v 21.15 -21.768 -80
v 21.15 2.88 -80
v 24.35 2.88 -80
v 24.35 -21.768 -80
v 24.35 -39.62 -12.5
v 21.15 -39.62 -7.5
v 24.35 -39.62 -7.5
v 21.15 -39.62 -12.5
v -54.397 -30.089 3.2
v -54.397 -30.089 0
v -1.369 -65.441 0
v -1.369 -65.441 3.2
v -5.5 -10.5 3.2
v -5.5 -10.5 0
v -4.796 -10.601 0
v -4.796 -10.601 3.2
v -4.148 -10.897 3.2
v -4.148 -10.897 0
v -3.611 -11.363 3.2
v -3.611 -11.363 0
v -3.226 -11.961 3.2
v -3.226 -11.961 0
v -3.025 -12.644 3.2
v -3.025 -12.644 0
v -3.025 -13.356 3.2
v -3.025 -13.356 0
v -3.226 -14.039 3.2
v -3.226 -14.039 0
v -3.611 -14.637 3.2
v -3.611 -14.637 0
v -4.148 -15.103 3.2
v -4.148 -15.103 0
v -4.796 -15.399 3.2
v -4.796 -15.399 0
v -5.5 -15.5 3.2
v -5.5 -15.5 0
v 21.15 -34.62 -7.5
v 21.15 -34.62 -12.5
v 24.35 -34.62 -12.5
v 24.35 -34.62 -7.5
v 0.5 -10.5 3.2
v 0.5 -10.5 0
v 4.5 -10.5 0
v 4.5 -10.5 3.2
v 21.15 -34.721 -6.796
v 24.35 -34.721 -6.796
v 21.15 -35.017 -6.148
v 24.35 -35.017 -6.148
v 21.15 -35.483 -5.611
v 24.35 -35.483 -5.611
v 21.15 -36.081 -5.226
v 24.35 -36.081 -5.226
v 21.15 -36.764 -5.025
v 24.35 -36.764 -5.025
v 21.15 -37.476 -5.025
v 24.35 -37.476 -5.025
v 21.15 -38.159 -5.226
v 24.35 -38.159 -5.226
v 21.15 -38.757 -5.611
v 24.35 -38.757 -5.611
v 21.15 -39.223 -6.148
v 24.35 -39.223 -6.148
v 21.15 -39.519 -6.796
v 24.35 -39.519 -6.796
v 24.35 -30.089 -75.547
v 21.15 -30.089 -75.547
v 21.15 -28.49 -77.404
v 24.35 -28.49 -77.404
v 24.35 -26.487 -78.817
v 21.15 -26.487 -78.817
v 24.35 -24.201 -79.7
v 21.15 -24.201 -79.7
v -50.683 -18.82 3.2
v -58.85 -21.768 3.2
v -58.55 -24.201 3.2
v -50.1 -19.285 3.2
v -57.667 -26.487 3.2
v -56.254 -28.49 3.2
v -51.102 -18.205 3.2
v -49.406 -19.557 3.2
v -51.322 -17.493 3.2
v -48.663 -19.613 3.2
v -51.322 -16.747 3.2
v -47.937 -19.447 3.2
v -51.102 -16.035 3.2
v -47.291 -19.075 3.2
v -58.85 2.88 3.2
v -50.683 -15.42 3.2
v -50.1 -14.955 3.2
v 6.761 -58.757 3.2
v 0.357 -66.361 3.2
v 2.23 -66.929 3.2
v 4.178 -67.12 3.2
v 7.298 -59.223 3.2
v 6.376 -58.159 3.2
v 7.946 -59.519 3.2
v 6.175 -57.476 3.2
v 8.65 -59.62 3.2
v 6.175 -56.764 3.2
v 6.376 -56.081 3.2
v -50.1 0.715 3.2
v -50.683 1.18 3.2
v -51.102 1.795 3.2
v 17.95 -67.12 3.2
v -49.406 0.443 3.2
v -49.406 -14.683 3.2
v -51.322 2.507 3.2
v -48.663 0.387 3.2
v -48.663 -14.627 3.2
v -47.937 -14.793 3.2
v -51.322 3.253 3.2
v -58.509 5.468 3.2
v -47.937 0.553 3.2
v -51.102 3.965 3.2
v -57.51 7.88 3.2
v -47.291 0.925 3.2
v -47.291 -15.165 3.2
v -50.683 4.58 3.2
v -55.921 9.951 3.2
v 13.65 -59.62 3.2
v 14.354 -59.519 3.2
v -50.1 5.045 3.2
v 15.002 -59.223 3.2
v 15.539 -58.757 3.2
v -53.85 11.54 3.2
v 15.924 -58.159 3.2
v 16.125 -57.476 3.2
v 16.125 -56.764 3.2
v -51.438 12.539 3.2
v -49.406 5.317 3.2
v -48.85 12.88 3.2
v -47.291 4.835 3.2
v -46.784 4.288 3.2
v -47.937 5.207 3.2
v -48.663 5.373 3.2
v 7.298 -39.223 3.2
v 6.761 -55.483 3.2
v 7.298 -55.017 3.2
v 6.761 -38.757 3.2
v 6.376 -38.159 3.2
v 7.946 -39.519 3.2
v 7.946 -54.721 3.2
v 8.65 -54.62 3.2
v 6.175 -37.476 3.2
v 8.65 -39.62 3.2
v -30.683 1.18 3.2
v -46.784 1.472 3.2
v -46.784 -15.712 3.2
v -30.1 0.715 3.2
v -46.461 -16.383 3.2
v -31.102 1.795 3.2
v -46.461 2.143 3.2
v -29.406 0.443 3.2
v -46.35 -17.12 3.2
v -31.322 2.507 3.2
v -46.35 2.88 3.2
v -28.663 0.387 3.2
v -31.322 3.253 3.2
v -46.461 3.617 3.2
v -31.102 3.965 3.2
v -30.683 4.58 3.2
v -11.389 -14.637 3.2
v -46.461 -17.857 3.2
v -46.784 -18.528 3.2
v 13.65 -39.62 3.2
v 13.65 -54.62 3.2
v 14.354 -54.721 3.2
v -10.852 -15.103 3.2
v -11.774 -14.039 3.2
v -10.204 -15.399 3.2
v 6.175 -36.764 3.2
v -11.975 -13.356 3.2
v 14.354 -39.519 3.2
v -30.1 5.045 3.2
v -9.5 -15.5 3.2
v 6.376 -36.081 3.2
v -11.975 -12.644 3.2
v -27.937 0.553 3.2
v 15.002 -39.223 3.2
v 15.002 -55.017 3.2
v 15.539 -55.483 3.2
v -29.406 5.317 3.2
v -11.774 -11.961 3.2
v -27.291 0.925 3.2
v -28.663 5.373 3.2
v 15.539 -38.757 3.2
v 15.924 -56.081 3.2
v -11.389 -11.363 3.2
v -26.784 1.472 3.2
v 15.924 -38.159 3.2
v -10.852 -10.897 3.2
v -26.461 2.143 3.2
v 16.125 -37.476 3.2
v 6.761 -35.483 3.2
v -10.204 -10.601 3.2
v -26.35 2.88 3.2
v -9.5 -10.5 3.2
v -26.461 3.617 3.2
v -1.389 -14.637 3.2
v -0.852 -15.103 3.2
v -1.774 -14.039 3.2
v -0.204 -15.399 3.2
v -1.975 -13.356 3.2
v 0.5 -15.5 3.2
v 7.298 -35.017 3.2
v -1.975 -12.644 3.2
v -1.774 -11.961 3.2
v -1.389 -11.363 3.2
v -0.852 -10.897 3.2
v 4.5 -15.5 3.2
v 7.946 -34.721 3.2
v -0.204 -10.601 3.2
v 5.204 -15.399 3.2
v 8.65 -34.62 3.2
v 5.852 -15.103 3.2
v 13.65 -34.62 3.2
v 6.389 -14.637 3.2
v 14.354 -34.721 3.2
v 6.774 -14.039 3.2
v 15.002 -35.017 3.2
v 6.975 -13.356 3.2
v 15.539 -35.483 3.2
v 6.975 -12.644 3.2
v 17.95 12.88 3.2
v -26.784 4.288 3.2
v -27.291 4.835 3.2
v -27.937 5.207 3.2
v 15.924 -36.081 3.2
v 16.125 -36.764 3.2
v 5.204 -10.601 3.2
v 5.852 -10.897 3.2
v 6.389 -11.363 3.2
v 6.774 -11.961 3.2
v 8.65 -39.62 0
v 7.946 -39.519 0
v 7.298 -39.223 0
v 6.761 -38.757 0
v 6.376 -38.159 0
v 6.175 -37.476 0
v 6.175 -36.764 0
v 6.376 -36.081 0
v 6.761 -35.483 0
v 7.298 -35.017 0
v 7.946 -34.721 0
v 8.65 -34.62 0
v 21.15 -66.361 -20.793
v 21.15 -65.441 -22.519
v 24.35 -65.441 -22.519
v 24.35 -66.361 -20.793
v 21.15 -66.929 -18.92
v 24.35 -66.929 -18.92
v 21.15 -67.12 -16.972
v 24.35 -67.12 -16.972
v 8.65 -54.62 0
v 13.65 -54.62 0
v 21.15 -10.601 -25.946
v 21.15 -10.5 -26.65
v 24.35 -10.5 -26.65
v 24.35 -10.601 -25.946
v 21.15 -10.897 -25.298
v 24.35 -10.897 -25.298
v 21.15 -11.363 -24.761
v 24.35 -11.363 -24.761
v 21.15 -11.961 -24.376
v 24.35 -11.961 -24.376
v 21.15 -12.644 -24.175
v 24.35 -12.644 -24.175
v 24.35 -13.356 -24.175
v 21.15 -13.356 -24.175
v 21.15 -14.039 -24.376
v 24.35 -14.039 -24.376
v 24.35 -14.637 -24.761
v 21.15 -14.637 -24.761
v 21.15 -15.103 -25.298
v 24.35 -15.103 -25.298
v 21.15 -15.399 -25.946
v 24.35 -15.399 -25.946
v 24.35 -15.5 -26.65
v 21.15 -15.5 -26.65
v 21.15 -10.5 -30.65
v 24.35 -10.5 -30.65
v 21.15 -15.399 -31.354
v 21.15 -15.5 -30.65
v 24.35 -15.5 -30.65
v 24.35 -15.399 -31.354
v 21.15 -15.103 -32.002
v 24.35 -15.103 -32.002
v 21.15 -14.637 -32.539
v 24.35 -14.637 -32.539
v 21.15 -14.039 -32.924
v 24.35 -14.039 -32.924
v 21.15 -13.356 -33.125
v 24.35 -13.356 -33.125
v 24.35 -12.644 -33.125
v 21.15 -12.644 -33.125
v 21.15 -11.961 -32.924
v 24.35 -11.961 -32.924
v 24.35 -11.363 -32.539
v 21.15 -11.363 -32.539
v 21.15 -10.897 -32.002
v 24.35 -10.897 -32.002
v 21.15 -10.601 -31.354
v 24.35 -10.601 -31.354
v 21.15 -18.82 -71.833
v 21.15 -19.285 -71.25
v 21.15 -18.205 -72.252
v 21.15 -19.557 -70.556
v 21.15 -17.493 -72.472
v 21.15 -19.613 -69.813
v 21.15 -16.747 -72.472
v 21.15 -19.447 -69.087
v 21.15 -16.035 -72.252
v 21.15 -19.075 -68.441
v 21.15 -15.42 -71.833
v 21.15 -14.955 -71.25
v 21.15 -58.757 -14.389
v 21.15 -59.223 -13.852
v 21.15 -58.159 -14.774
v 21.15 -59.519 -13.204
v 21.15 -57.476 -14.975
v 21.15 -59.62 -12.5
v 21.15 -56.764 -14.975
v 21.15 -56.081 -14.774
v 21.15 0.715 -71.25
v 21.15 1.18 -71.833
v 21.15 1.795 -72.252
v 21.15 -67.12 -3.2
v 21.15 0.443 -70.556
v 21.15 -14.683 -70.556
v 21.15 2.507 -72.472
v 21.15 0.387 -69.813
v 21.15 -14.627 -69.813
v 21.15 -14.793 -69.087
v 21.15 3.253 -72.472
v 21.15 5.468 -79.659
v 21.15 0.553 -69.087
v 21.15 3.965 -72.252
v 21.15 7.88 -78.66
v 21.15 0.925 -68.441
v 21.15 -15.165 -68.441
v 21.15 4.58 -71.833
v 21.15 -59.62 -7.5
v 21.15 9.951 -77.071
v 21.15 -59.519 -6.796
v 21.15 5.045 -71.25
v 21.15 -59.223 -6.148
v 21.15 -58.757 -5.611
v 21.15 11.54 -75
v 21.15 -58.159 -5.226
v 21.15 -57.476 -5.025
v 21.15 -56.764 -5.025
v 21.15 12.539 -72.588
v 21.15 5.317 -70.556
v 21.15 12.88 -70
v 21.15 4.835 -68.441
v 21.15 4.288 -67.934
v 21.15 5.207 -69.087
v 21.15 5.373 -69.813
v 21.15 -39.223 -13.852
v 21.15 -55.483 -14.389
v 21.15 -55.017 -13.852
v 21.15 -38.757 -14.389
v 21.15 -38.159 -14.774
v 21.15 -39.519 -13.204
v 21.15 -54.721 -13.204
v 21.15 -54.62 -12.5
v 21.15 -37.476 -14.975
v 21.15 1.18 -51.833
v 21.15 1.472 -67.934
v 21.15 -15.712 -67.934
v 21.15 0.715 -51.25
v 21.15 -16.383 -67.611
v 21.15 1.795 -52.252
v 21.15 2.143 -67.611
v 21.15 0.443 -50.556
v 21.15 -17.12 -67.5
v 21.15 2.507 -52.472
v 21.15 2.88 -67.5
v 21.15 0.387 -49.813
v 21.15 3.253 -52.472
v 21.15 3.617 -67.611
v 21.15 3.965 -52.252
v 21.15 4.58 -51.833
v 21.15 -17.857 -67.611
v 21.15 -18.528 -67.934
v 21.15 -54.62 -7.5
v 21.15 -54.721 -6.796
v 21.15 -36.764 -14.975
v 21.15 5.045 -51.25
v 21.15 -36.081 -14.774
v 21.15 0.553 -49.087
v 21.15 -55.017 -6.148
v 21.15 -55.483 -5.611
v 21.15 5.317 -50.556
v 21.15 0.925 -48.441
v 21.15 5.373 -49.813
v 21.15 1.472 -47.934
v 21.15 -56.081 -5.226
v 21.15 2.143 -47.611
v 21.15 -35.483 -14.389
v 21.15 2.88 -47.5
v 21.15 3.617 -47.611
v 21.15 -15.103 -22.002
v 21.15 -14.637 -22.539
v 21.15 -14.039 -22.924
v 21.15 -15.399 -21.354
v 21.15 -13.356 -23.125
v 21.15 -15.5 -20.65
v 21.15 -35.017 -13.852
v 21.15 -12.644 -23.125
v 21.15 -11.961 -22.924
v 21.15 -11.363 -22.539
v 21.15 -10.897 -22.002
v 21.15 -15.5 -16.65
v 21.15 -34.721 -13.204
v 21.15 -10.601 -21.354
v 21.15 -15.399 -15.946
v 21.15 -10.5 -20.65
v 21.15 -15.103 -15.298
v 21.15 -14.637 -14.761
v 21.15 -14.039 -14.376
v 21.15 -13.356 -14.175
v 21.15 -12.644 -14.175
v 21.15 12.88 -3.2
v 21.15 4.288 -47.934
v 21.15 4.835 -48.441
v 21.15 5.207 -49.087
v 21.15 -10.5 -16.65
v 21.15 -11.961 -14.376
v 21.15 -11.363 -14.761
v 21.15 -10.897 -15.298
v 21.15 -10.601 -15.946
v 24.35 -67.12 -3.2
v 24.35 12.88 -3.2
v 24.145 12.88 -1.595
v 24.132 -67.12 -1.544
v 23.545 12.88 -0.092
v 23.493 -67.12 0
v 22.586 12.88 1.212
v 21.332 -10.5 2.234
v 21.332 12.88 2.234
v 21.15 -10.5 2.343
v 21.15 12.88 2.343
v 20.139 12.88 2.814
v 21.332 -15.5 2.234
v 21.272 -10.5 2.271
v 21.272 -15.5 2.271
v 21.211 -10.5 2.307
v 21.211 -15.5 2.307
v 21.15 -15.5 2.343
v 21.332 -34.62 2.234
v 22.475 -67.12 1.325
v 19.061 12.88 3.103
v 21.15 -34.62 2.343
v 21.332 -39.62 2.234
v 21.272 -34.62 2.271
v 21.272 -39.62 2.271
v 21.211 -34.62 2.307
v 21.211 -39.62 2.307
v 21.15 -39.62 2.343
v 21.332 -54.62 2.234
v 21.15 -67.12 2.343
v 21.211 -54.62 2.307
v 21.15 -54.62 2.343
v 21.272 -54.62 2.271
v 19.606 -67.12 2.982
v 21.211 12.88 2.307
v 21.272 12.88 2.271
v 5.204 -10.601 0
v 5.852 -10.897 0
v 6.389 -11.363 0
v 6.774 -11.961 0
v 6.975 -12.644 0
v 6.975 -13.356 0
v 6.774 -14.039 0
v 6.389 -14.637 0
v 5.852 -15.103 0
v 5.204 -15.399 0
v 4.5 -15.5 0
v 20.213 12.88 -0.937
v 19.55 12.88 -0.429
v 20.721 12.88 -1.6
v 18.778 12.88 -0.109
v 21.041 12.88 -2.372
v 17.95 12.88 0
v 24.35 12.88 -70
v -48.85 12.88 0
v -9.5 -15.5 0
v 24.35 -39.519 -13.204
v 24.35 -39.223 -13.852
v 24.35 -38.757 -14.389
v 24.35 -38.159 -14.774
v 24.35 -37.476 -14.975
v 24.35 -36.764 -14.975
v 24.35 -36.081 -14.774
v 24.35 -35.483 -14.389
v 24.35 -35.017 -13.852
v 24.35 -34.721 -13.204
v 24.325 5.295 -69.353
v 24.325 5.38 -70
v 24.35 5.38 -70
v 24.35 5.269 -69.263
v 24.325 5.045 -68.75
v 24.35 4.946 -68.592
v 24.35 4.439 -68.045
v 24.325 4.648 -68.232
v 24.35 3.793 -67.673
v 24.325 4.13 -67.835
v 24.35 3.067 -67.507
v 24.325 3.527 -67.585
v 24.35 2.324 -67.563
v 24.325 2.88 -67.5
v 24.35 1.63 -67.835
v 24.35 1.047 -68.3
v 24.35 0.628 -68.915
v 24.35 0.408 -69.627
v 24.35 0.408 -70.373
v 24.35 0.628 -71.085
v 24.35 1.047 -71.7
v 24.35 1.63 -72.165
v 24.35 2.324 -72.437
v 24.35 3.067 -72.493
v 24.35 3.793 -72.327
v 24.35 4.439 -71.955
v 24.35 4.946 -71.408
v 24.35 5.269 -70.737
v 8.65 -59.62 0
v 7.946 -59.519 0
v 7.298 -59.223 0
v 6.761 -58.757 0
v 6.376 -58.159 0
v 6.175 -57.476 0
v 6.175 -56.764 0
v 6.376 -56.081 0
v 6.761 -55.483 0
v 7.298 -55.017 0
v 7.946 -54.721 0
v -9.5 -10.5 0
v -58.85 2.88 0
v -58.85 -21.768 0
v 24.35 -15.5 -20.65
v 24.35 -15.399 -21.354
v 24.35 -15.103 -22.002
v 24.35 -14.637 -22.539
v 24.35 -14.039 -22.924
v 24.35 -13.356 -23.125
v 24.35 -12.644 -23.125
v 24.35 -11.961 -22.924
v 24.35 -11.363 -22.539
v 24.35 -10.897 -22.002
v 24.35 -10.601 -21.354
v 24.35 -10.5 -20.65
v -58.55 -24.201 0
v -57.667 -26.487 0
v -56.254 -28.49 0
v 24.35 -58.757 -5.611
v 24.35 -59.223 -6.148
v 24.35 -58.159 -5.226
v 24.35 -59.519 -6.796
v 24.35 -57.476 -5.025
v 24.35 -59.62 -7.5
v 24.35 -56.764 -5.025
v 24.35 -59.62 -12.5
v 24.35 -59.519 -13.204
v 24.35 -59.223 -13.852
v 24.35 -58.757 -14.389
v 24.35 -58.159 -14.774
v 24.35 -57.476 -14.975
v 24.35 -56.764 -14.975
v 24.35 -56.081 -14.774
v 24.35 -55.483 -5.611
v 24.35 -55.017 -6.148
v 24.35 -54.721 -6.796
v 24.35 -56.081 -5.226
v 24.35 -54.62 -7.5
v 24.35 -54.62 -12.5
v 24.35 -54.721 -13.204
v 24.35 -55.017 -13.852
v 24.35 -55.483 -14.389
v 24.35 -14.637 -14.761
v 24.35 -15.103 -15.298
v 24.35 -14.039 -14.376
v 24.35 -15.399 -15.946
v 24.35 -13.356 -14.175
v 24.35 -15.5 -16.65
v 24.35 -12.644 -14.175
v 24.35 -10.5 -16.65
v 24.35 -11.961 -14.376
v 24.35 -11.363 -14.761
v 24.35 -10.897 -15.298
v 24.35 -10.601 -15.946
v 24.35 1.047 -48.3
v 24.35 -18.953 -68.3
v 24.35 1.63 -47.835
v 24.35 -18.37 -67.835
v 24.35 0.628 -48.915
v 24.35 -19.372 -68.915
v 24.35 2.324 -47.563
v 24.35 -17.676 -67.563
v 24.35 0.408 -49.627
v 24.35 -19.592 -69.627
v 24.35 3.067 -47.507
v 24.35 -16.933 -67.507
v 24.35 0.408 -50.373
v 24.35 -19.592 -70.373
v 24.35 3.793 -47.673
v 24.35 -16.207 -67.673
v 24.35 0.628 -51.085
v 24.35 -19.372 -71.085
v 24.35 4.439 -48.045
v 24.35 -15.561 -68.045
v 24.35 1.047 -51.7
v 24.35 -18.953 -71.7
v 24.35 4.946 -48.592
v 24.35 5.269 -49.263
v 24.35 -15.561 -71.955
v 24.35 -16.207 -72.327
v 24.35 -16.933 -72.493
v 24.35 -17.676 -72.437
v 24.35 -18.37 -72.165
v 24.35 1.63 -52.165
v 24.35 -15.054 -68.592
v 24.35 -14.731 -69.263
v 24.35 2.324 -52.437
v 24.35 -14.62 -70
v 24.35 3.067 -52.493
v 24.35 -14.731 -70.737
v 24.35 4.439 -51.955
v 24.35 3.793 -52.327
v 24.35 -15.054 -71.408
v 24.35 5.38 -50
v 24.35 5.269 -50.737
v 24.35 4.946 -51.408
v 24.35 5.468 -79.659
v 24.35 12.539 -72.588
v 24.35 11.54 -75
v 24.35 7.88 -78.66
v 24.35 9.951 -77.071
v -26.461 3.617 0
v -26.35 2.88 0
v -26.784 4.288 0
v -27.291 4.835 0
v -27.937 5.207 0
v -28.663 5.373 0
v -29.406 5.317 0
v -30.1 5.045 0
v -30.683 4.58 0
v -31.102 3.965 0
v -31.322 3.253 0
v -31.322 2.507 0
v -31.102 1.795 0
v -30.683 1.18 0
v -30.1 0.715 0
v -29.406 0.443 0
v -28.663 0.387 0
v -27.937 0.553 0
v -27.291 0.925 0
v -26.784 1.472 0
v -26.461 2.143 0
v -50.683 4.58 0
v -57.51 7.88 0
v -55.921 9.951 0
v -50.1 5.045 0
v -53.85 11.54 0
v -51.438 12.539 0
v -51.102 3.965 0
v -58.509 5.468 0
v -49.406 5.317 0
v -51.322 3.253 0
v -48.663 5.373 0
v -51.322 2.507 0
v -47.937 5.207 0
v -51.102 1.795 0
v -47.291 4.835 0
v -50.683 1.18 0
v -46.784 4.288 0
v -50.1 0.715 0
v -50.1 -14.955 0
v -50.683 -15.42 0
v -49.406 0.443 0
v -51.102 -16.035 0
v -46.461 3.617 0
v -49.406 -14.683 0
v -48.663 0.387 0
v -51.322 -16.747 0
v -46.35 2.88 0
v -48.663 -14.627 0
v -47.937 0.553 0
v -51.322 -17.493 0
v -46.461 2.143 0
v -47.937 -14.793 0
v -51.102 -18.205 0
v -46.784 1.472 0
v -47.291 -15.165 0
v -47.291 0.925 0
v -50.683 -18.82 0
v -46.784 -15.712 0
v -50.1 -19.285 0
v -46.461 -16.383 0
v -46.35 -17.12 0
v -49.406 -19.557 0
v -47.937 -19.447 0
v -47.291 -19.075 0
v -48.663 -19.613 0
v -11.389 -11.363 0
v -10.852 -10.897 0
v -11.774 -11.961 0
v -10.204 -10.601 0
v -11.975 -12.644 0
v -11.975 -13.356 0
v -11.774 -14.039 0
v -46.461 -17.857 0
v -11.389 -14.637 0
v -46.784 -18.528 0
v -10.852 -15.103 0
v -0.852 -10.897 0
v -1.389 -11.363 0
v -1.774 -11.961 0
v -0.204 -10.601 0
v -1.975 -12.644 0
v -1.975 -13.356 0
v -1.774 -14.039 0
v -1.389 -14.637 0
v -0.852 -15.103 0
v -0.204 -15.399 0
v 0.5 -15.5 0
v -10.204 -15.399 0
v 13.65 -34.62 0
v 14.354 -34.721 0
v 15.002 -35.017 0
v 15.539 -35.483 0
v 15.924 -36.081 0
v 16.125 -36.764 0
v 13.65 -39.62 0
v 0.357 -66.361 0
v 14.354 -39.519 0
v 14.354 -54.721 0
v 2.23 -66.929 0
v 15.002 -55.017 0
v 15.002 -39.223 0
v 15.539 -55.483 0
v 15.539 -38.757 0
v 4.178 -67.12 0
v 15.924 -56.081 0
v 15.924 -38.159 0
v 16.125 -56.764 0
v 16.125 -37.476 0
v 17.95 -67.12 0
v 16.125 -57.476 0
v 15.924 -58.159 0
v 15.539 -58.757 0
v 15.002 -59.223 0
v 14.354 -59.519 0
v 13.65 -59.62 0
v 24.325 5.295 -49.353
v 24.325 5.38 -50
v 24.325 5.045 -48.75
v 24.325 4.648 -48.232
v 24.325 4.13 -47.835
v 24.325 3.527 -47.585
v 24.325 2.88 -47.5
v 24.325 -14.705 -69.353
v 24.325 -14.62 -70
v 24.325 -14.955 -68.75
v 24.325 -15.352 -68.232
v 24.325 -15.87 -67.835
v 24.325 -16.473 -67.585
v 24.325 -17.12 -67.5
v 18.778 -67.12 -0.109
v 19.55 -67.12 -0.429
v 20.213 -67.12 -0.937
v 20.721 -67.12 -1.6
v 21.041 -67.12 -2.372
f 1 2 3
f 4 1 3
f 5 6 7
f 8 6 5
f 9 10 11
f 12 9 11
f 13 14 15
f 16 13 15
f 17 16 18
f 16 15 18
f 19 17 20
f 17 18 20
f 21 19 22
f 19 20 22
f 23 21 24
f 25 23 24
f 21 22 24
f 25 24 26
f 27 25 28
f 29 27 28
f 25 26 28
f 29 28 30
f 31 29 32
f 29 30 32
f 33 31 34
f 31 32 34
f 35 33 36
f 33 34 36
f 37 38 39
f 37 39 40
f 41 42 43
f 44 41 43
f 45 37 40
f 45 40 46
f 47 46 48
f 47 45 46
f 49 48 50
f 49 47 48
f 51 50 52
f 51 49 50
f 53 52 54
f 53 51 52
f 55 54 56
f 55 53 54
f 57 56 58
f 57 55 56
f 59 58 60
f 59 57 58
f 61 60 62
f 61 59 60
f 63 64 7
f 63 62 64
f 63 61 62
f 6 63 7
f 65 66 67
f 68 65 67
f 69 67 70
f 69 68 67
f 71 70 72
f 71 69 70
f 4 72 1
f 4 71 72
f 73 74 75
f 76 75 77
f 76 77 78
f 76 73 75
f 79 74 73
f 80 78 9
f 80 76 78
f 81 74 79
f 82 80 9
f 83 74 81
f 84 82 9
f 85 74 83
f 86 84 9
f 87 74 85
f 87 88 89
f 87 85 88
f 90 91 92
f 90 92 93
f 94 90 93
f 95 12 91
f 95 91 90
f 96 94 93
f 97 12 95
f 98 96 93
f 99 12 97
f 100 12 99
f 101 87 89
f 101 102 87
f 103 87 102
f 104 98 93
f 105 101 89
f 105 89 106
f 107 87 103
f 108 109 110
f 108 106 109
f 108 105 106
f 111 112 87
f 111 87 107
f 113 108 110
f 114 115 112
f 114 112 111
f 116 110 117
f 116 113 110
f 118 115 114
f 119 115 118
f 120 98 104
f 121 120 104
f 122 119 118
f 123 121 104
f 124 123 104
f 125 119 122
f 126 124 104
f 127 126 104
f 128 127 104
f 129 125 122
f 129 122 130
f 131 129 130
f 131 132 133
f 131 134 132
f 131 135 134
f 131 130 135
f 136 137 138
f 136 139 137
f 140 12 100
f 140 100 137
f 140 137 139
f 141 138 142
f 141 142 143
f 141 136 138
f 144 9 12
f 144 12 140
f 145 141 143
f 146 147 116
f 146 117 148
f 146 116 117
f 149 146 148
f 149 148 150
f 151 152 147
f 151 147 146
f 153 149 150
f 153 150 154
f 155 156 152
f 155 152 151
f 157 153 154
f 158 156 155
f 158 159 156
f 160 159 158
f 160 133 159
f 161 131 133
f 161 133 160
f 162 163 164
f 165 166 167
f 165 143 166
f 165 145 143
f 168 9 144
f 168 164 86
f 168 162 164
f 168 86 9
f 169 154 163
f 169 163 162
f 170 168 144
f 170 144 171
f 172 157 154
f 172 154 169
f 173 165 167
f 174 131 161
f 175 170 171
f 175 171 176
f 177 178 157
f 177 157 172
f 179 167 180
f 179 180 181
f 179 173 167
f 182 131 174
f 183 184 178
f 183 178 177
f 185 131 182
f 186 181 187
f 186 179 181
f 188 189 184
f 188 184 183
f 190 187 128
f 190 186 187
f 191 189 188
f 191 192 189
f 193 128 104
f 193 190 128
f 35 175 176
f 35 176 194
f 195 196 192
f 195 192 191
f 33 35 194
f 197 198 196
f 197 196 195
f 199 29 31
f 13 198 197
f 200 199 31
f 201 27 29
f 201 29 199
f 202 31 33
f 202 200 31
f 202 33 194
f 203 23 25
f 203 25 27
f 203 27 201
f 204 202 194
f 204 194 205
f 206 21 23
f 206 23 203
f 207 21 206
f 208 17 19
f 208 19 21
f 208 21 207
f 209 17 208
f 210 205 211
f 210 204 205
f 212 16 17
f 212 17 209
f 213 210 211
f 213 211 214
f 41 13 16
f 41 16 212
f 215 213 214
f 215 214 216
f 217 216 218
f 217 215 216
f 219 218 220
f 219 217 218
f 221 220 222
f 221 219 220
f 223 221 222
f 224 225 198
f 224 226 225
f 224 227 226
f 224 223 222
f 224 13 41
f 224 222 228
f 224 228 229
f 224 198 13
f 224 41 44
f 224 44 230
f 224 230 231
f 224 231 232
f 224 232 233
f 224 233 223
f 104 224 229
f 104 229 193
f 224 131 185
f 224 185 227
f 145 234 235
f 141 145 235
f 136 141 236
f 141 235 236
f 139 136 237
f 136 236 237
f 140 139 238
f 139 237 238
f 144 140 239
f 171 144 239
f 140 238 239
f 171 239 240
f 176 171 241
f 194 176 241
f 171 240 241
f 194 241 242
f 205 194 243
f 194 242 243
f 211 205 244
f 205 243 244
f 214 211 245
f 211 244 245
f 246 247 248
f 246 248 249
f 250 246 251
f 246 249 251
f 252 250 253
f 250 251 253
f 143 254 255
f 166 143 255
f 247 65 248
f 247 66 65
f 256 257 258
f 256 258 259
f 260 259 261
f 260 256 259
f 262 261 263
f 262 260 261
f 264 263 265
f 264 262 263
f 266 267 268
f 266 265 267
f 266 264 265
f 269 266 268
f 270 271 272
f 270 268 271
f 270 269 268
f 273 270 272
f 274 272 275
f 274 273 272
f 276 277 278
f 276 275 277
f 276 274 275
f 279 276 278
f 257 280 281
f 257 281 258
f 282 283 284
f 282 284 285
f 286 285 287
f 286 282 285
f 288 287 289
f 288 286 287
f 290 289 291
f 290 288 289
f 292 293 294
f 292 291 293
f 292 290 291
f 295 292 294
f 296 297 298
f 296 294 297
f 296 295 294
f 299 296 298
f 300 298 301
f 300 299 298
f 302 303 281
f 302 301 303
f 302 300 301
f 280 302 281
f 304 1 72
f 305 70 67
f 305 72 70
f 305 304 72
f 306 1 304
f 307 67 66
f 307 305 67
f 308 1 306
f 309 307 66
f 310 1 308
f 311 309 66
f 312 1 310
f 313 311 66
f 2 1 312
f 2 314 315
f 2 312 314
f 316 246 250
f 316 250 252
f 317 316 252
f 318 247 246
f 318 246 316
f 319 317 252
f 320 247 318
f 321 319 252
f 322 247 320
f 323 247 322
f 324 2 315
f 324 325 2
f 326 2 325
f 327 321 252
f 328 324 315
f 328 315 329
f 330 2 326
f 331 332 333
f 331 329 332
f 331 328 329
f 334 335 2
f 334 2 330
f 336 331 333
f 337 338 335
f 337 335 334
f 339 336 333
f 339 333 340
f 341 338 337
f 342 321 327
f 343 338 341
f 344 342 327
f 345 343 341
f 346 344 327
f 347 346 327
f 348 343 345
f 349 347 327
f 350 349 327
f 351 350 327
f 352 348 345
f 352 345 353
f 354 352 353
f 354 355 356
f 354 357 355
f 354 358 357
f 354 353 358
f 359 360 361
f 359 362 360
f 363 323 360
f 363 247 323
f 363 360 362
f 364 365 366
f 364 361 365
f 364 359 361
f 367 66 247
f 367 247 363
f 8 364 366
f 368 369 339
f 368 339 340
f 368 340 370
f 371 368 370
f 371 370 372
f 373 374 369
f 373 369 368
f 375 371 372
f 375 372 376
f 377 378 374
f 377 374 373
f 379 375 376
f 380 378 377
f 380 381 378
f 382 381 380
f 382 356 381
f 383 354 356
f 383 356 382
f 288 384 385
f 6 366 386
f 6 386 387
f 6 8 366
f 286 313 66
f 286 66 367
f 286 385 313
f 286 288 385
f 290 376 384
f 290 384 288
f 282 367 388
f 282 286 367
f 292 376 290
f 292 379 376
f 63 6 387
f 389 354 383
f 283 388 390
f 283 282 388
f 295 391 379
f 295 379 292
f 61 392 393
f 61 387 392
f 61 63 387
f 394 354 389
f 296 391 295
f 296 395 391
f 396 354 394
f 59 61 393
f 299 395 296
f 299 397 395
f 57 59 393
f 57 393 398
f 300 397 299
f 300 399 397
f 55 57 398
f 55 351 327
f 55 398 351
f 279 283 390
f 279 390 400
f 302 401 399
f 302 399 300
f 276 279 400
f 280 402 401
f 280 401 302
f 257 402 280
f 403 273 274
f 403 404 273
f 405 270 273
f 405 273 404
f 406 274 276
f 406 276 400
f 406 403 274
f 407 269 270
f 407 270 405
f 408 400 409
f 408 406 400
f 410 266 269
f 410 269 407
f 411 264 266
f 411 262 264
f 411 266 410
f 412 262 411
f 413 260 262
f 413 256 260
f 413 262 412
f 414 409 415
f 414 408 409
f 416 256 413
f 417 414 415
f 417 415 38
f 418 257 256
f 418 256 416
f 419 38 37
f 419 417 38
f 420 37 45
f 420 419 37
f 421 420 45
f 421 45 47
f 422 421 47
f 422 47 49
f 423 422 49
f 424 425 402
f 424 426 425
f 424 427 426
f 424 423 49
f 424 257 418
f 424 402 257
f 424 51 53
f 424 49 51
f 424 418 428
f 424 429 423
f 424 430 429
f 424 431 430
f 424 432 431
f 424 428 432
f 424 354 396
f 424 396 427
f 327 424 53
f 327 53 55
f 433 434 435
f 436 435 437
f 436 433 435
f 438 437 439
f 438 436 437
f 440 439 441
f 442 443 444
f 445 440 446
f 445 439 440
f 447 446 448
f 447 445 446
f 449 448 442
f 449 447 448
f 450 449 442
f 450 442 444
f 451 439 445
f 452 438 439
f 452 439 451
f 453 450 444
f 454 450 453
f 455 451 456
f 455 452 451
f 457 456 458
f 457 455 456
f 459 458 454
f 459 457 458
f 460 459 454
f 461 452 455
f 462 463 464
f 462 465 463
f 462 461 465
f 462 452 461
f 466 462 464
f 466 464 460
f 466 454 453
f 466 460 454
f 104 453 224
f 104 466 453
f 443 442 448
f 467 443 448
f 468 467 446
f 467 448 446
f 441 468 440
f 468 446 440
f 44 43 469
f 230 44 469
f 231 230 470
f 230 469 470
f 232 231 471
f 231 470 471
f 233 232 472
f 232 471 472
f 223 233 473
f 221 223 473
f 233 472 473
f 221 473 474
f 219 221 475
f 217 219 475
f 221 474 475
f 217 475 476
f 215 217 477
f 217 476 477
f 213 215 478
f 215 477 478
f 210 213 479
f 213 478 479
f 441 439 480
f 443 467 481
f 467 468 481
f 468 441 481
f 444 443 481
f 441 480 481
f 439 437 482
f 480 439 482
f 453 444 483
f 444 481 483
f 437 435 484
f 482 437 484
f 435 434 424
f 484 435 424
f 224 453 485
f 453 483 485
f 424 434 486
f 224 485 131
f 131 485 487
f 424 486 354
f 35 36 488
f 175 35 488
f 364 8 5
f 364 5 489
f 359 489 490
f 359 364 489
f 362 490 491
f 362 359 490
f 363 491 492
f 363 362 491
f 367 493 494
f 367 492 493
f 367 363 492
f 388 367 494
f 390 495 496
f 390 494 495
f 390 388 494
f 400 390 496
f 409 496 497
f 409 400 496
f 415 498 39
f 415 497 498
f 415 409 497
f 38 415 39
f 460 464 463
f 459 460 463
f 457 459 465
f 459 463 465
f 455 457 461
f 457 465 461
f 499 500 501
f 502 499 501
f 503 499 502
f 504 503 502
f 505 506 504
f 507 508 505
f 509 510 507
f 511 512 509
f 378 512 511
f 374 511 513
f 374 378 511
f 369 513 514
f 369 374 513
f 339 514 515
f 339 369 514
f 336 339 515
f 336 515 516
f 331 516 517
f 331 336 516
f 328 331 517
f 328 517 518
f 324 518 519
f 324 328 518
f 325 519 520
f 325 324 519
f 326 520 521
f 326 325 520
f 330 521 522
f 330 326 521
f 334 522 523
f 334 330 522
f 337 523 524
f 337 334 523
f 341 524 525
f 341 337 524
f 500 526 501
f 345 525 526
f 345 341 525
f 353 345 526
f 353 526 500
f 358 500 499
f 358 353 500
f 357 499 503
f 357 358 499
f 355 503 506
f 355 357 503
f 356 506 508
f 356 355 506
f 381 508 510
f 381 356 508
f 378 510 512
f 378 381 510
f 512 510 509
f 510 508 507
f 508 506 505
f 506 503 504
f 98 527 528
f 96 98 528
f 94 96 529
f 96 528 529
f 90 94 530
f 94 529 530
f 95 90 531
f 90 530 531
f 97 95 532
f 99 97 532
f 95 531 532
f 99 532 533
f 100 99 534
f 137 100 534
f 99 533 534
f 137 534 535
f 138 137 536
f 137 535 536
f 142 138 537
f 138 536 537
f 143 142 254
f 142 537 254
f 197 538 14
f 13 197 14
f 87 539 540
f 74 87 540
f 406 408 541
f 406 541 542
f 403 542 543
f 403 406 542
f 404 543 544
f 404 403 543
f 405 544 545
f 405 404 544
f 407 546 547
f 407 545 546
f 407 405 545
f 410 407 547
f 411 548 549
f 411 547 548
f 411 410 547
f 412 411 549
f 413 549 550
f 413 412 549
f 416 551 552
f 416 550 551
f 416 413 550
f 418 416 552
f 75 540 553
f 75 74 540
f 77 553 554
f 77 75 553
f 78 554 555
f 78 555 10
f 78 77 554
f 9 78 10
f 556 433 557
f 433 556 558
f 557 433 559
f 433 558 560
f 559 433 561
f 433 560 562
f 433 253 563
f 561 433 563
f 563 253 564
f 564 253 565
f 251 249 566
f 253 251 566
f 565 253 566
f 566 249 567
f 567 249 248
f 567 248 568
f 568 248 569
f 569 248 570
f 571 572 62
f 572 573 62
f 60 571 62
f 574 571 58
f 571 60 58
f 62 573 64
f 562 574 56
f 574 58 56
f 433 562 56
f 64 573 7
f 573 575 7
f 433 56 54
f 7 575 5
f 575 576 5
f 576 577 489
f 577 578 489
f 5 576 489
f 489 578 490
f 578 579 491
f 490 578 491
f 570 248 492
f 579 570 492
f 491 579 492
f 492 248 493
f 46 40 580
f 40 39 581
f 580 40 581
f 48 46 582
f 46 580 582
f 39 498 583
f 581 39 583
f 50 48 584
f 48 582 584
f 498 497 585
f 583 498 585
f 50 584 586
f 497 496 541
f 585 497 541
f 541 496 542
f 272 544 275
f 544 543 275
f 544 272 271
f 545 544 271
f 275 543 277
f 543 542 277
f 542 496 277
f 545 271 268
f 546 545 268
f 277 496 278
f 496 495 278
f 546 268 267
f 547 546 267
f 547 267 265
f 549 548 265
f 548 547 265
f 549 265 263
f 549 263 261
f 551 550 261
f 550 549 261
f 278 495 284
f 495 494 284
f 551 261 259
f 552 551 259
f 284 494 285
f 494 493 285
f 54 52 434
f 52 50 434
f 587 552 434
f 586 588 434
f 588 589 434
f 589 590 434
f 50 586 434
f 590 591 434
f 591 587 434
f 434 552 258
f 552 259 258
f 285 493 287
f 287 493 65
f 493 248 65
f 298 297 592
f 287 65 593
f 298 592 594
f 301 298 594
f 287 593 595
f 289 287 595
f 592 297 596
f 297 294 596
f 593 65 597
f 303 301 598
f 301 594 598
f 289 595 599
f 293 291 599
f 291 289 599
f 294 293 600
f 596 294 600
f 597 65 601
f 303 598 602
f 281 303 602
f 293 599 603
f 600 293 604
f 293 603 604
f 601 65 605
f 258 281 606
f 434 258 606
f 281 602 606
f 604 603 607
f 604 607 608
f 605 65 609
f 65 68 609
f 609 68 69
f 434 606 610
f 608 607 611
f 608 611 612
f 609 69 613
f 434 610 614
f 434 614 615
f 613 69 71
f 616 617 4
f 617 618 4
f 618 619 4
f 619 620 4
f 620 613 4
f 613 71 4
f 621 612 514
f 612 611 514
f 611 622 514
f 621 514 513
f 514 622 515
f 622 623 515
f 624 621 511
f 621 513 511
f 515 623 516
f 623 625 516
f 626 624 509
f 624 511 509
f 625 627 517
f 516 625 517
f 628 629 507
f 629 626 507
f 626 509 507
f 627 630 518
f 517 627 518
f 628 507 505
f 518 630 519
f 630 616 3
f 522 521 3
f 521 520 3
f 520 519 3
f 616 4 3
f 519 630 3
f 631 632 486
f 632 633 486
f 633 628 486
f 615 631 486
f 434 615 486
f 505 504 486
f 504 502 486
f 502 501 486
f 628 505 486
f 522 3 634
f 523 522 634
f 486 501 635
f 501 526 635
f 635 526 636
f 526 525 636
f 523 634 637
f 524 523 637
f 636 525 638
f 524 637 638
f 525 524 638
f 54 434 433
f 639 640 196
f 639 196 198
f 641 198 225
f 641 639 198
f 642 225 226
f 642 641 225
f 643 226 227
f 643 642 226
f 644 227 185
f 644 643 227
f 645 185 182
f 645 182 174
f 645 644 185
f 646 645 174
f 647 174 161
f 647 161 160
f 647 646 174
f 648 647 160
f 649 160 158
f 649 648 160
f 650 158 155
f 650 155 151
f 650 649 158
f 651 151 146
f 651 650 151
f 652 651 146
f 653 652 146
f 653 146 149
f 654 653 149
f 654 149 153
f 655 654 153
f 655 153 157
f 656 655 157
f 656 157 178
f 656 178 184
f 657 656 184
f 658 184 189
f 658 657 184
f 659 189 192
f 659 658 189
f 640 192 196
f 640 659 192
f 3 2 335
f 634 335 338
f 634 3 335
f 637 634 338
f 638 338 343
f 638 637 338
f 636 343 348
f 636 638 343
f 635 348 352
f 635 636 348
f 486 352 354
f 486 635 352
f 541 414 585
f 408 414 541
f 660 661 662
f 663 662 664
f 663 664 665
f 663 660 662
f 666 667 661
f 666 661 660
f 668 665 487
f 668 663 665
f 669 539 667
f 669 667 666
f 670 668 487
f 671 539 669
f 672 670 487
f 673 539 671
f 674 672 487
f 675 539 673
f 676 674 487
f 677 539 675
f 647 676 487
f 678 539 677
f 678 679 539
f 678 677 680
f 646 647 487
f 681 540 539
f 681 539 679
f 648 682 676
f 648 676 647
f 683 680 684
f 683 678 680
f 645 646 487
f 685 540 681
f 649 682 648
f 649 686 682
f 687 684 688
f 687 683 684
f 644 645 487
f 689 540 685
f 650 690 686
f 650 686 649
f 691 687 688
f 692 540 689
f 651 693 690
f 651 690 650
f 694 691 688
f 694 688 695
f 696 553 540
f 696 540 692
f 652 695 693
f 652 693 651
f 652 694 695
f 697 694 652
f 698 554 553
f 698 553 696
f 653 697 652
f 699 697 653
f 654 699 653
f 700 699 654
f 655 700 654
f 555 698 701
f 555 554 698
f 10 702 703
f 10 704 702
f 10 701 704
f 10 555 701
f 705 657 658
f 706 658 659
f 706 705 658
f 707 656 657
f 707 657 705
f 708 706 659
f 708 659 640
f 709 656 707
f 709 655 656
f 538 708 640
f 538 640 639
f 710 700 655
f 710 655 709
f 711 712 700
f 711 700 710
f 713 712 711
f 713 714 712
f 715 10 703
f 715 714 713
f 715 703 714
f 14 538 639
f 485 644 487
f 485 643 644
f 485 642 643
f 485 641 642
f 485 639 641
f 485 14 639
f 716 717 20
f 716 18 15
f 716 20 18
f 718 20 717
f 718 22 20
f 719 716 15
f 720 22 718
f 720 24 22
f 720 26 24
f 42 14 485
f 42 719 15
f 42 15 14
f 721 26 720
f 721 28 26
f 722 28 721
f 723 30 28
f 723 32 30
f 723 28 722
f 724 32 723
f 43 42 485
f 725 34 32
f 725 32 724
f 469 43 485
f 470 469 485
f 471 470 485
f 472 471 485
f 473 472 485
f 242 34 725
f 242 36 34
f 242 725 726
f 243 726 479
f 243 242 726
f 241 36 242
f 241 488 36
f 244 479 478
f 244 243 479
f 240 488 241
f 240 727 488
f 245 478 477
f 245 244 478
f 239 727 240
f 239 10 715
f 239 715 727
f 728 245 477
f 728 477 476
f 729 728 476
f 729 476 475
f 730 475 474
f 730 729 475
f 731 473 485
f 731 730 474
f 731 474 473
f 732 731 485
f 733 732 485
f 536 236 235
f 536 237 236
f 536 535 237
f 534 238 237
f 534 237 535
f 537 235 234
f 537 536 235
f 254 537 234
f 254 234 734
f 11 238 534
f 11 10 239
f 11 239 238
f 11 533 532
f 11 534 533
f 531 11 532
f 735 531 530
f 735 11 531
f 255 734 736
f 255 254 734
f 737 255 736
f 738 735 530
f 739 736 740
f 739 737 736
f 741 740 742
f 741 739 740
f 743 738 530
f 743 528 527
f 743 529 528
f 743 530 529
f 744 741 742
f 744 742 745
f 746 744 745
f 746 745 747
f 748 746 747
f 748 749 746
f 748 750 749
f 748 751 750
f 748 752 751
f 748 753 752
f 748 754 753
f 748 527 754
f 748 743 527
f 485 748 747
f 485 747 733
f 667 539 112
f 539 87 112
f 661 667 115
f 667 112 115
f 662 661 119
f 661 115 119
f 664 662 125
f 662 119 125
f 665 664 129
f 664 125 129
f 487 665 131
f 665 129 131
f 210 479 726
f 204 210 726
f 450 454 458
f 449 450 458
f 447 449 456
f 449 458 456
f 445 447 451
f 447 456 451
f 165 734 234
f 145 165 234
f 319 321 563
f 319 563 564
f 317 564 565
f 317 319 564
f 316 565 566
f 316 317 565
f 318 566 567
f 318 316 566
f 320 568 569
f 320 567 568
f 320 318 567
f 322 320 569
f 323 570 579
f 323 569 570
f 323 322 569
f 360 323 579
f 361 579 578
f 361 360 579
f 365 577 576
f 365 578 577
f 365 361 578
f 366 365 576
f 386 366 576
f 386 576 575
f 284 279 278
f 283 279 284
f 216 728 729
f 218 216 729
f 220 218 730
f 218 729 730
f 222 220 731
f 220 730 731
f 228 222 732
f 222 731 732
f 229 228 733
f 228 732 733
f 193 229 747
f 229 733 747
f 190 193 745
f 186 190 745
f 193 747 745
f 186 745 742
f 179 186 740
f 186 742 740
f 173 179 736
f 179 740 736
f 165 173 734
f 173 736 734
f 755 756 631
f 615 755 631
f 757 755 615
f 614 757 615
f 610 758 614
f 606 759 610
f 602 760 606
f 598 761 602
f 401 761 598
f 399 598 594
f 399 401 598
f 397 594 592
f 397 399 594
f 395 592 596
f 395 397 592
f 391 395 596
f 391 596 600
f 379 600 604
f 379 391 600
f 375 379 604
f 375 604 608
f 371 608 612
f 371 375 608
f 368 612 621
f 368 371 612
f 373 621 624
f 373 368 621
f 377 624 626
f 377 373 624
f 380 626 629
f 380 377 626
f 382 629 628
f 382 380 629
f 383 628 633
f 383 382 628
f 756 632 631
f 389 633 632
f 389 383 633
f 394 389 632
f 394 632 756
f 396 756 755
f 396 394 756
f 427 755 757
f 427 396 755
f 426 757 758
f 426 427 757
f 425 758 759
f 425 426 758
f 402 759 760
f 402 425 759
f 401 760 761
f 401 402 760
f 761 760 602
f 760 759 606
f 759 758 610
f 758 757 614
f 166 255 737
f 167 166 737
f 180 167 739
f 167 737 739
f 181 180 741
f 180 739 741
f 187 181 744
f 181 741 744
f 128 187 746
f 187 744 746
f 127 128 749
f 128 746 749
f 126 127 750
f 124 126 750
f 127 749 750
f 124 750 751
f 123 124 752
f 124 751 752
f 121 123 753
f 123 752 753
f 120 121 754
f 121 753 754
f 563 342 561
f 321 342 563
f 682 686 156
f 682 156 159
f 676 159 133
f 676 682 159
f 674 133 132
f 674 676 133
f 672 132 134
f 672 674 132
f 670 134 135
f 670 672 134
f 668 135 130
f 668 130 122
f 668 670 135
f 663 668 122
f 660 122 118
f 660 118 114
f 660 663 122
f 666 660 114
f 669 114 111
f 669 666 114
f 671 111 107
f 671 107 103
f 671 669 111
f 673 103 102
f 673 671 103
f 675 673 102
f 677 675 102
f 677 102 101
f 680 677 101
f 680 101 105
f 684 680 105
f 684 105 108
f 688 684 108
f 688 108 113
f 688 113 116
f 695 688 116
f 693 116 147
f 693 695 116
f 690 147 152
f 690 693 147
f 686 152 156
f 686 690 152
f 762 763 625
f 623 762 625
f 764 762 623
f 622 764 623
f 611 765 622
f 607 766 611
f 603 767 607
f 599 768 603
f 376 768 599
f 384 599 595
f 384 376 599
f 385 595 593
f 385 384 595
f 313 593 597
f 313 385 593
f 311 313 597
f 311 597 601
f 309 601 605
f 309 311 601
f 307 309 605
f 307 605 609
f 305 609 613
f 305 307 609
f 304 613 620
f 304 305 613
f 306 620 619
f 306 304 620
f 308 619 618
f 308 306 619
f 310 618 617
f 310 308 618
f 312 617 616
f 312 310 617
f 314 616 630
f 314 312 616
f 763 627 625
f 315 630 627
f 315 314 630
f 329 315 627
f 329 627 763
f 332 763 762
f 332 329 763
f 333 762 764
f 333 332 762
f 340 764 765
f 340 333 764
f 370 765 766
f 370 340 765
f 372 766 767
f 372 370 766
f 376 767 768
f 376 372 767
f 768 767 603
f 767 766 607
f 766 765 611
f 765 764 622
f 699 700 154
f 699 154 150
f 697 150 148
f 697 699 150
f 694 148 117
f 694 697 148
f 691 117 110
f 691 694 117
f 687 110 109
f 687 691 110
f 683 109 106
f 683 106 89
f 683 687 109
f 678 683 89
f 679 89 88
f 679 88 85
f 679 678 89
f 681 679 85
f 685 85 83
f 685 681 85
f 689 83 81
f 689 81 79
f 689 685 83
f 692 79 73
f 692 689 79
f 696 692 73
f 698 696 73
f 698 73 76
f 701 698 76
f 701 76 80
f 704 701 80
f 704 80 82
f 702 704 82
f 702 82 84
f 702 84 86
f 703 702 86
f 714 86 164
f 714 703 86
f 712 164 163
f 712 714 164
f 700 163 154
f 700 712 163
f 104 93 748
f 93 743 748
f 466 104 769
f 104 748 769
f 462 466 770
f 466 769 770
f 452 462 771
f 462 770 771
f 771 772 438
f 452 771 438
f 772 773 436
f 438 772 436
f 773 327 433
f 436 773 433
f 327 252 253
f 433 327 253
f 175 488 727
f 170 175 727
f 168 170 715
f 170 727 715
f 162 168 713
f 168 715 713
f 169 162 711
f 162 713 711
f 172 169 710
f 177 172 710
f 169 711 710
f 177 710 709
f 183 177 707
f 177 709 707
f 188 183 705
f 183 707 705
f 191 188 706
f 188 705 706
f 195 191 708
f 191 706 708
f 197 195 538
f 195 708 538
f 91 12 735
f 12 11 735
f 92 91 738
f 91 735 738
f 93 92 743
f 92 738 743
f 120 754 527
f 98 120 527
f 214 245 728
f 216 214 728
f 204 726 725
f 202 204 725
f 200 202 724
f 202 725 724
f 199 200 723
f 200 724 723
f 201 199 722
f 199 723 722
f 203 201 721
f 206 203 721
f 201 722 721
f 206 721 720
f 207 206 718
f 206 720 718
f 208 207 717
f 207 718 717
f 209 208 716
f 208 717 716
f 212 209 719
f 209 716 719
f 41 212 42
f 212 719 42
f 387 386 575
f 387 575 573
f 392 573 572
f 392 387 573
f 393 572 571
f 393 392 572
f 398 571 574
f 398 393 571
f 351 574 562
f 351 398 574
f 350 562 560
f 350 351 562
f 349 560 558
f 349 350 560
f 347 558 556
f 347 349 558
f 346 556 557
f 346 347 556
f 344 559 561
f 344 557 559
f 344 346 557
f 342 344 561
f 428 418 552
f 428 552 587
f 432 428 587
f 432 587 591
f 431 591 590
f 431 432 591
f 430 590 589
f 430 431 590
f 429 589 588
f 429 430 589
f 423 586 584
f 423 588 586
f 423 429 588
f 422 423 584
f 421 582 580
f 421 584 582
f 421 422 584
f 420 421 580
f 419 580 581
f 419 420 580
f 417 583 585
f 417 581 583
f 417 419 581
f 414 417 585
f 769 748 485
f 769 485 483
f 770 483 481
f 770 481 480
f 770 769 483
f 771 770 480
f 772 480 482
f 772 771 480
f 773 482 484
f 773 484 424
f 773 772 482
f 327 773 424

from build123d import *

# Parameters (mm, degrees)
BOSS_EXTRUDE1_DEPTH        = 3.175
SKETCH2_R                  = 2.5
CUT_EXTRUDE2_DEPTH         = 10
SKETCH8_W                  = 3.175
SKETCH8_H                  = 3.175
BOSS_EXTRUDE2_DEPTH        = 80
CONVERT_SOLID2_START       = 2.233560192
CONVERT_SOLID2_OUTLINE_W   = 3.175
CONVERT_SOLID2_OUTLINE_H   = 23.379999999
CONVERT_SOLID2_OUTLINE_H_2 = 19.120000001
CONVERT_SOLID2_OUTLINE_H_3 = 15
CONVERT_SOLID2_DEPTH       = 0.941439808
CONVERT_SOLID2_START_2     = -3.2
CONVERT_SOLID2_2_OUTLINE_R = 2.5
CONVERT_SOLID2_2_DEPTH     = 3.650867885
CONVERT_SOLID2_START_3     = -80
CONVERT_SOLID2_3_OUTLINE_W = 0.025
CONVERT_SOLID2_3_OUTLINE_H = 80
CONVERT_SOLID2_3_DEPTH     = 77.404032
CONVERT_SOLID2_START_4     = 3.175
CONVERT_SOLID2_4_OUTLINE_R = 2.5
CONVERT_SOLID2_4_DEPTH     = 0.025
CONVERT_SOLID2_START_5     = -54.620000001
CONVERT_SOLID2_5_DEPTH     = 67.5
CONVERT_SOLID2_START_6     = -67.120000001
CONVERT_SOLID2_6_DEPTH     = 80
CONVERT_SOLID2_START_7     = 24.325
CONVERT_SOLID2_7_OUTLINE_R = 2.5
CONVERT_SOLID2_7_DEPTH     = 0.675
FILLET1_R                  = 10


with BuildPart() as part:
    # Sketch1 → Boss-Extrude1 (new body)
    with BuildSketch(Plane.XY):
        Polygon((-58.85, 12.879999999), (-58.85, -27.120000001), (1.15, -67.120000001), (21.15, -67.120000001), (21.15, 12.879999999), align=None)
    extrude(amount=BOSS_EXTRUDE1_DEPTH)

    # Sketch2 → Cut-Extrude2 (cut)
    with BuildSketch(Plane.XY.offset(3.175)):
        with Locations((-48.85, 2.879999999)):
            Circle(SKETCH2_R)
        with Locations((-48.85, -17.12)):
            Circle(SKETCH2_R)
        with Locations((-28.85, 2.879999999)):
            Circle(SKETCH2_R)
        with BuildLine():
            Line((8.65, -54.620000001), (13.65, -54.620000001))
            ThreePointArc((13.65, -54.620000001), (16.15, -57.120000001), (13.65, -59.620000001))
            Line((13.65, -59.620000001), (8.65, -59.620000001))
            ThreePointArc((8.65, -59.620000001), (6.15, -57.120000001), (8.65, -54.620000001))
        make_face()
        with BuildLine():
            Line((8.65, -34.620000001), (13.65, -34.620000001))
            ThreePointArc((13.65, -34.620000001), (16.15, -37.120000001), (13.65, -39.620000001))
            Line((13.65, -39.620000001), (8.65, -39.620000001))
            ThreePointArc((8.65, -39.620000001), (6.15, -37.120000001), (8.65, -34.620000001))
        make_face()
        with BuildLine():
            Line((-5.5, -15.5), (-9.5, -15.5))
            ThreePointArc((-9.5, -15.5), (-12, -13), (-9.5, -10.5))
            Line((-9.5, -10.5), (-5.5, -10.5))
            ThreePointArc((-5.5, -10.5), (-3, -13), (-5.5, -15.5))
        make_face()
        with BuildLine():
            Line((0.5, -10.5), (4.5, -10.5))
            ThreePointArc((4.5, -10.5), (7, -13), (4.5, -15.5))
            Line((4.5, -15.5), (0.5, -15.5))
            ThreePointArc((0.5, -15.5), (-2, -13), (0.5, -10.5))
        make_face()
    extrude(amount=-CUT_EXTRUDE2_DEPTH, mode=Mode.SUBTRACT)


with BuildPart() as body_2:
    # Mirror1: mirrored copy
    add(part.part.mirror(Plane(origin=(10.575, 0, -10.575), x_dir=(0.7071067811865489, 0, 0.7071067811865462), z_dir=(0.7071067811865464, 0, -0.7071067811865488))))


with BuildPart() as part_1:
    add(part.part)

    add(body_2.part)  # Boss-Extrude2 merges body 2
    # Sketch8 → Boss-Extrude2 (add, through all)
    with BuildSketch(Plane(origin=(0, 12.879999999, 0), x_dir=(1, 0, 0), z_dir=(0, 1, 0))):
        with Locations((22.7375, -1.5875)):
            Rectangle(SKETCH8_W, SKETCH8_H)
    extrude(amount=-BOSS_EXTRUDE2_DEPTH)

    # Convert-Solid2: read off the stored shape, not the designer's step
    # Convert-Solid2 outline → Convert-Solid2 (cut)
    with BuildSketch(Plane.XY.offset(CONVERT_SOLID2_START)):
        with Locations((22.7375, 1.19)):
            Rectangle(CONVERT_SOLID2_OUTLINE_W, CONVERT_SOLID2_OUTLINE_H)
        with Locations((22.7375, -25.060000001)):
            Rectangle(CONVERT_SOLID2_OUTLINE_W, CONVERT_SOLID2_OUTLINE_H_2)
        with Locations((22.7375, -47.120000001)):
            Rectangle(CONVERT_SOLID2_OUTLINE_W, CONVERT_SOLID2_OUTLINE_H_3)
    extrude(amount=CONVERT_SOLID2_DEPTH, mode=Mode.SUBTRACT)

    # Convert-Solid2 2 outline → Convert-Solid2 2 (add)
    with BuildSketch(Plane.XY.offset(CONVERT_SOLID2_START_2)):
        Polygon((21.15, 12.879999999), (-58.85, 12.879999999), (-58.85, -27.120000001), (1.15, -67.120000001), (21.15, -67.120000001), align=None)
        with BuildLine():
            Line((13.65, -59.620000001), (8.65, -59.620000001))
            ThreePointArc((8.65, -59.620000001), (6.15, -57.120000001), (8.65, -54.620000001))
            Line((8.65, -54.620000001), (13.65, -54.620000001))
            ThreePointArc((13.65, -54.620000001), (16.15, -57.120000001), (13.65, -59.620000001))
        make_face(mode=Mode.SUBTRACT)
        with BuildLine():
            Line((13.65, -39.620000001), (8.65, -39.620000001))
            ThreePointArc((8.65, -39.620000001), (6.15, -37.120000001), (8.65, -34.620000001))
            Line((8.65, -34.620000001), (13.65, -34.620000001))
            ThreePointArc((13.65, -34.620000001), (16.15, -37.120000001), (13.65, -39.620000001))
        make_face(mode=Mode.SUBTRACT)
        with Locations((-48.85, -17.12)):
            Circle(CONVERT_SOLID2_2_OUTLINE_R, mode=Mode.SUBTRACT)
        with Locations((-48.85, 2.879999999)):
            Circle(CONVERT_SOLID2_2_OUTLINE_R, mode=Mode.SUBTRACT)
        with Locations((-28.85, 2.879999999)):
            Circle(CONVERT_SOLID2_2_OUTLINE_R, mode=Mode.SUBTRACT)
        with BuildLine():
            Line((-9.5, -10.5), (-5.5, -10.5))
            ThreePointArc((-5.5, -10.5), (-3, -13), (-5.5, -15.5))
            Line((-5.5, -15.5), (-9.5, -15.5))
            ThreePointArc((-9.5, -15.5), (-12, -13), (-9.5, -10.5))
        make_face(mode=Mode.SUBTRACT)
        with BuildLine():
            Line((0.5, -10.5), (4.5, -10.5))
            ThreePointArc((4.5, -10.5), (7, -13), (4.5, -15.5))
            Line((4.5, -15.5), (0.5, -15.5))
            ThreePointArc((0.5, -15.5), (-2, -13), (0.5, -10.5))
        make_face(mode=Mode.SUBTRACT)
    extrude(amount=CONVERT_SOLID2_2_DEPTH)

    # Convert-Solid2 3 outline → Convert-Solid2 3 (add)
    with BuildSketch(Plane.XY.offset(CONVERT_SOLID2_START_3)):
        with Locations((24.3375, -27.120000001)):
            Rectangle(CONVERT_SOLID2_3_OUTLINE_W, CONVERT_SOLID2_3_OUTLINE_H)
    extrude(amount=CONVERT_SOLID2_3_DEPTH)

    # Convert-Solid2 4 outline → Convert-Solid2 4 (add)
    with BuildSketch(Plane.XY.offset(CONVERT_SOLID2_START_4)):
        Polygon((21.15, 12.879999999), (-58.85, 12.879999999), (-58.85, -27.120000001), (1.15, -67.120000001), (21.15, -67.120000001), align=None)
        with BuildLine():
            Line((13.65, -59.620000001), (8.65, -59.620000001))
            ThreePointArc((8.65, -59.620000001), (6.15, -57.120000001), (8.65, -54.620000001))
            Line((8.65, -54.620000001), (13.65, -54.620000001))
            ThreePointArc((13.65, -54.620000001), (16.15, -57.120000001), (13.65, -59.620000001))
        make_face(mode=Mode.SUBTRACT)
        with BuildLine():
            Line((13.65, -39.620000001), (8.65, -39.620000001))
            ThreePointArc((8.65, -39.620000001), (6.15, -37.120000001), (8.65, -34.620000001))
            Line((8.65, -34.620000001), (13.65, -34.620000001))
            ThreePointArc((13.65, -34.620000001), (16.15, -37.120000001), (13.65, -39.620000001))
        make_face(mode=Mode.SUBTRACT)
        with Locations((-48.85, -17.12)):
            Circle(CONVERT_SOLID2_4_OUTLINE_R, mode=Mode.SUBTRACT)
        with Locations((-48.85, 2.879999999)):
            Circle(CONVERT_SOLID2_4_OUTLINE_R, mode=Mode.SUBTRACT)
        with Locations((-28.85, 2.879999999)):
            Circle(CONVERT_SOLID2_4_OUTLINE_R, mode=Mode.SUBTRACT)
        with BuildLine():
            Line((-9.5, -10.5), (-5.5, -10.5))
            ThreePointArc((-5.5, -10.5), (-3, -13), (-5.5, -15.5))
            Line((-5.5, -15.5), (-9.5, -15.5))
            ThreePointArc((-9.5, -15.5), (-12, -13), (-9.5, -10.5))
        make_face(mode=Mode.SUBTRACT)
        with BuildLine():
            Line((0.5, -10.5), (4.5, -10.5))
            ThreePointArc((4.5, -10.5), (7, -13), (4.5, -15.5))
            Line((4.5, -15.5), (0.5, -15.5))
            ThreePointArc((0.5, -15.5), (-2, -13), (0.5, -10.5))
        make_face(mode=Mode.SUBTRACT)
    extrude(amount=CONVERT_SOLID2_4_DEPTH)

    # Convert-Solid2 5 outline → Convert-Solid2 5 (add)
    with BuildSketch(Plane(origin=(0, 0, 0), x_dir=(1, 0, 0), z_dir=(0, 1, 0)).offset(CONVERT_SOLID2_START_5)):
        with BuildLine():
            Line((21.15, -2.233560192), (21.15, -2.342562585))
            ThreePointArc((21.15, -2.342562585), (21.241340362, -2.288813955), (21.331778178, -2.233560192))
            Line((21.331778178, -2.233560192), (21.15, -2.233560192))
        make_face()
    extrude(amount=CONVERT_SOLID2_5_DEPTH)

    # Convert-Solid2 6 outline → Convert-Solid2 6 (cut)
    with BuildSketch(Plane(origin=(0, 0, 0), x_dir=(1, 0, 0), z_dir=(0, 1, 0)).offset(CONVERT_SOLID2_START_6)):
        with BuildLine():
            Line((-58.85, 3.2), (-58.85, 0))
            Line((-58.85, 0), (17.95, 0))
            ThreePointArc((17.95, 0), (20.2127417, 0.9372583), (21.15, 3.2))
            Line((21.15, 3.2), (-58.85, 3.2))
        make_face()
        with BuildLine():
            Line((17.95, -3.2), (21.15, -3.2))
            Line((21.15, -3.2), (21.15, -3.175))
            Line((21.15, -3.175), (24.325, -3.175))
            Line((24.325, -3.175), (24.325, 2.595968))
            Line((24.325, 2.595968), (24.35, 2.595968))
            Line((24.35, 2.595968), (24.35, 3.2))
            ThreePointArc((24.35, 3.2), (22.4754834, -1.3254834), (17.95, -3.2))
        make_face()
    extrude(amount=CONVERT_SOLID2_6_DEPTH, mode=Mode.SUBTRACT)

    # Convert-Solid2 7 outline → Convert-Solid2 7 (cut)
    with BuildSketch(Plane.YZ.offset(CONVERT_SOLID2_START_7)):
        Polygon((-27.120000001, -80), (-67.120000001, -20), (-67.120000001, -80), align=None)
        with BuildLine():
            Line((-59.620000001, -7.5), (-59.620000001, -12.5))
            ThreePointArc((-59.620000001, -12.5), (-57.120000001, -15), (-54.620000001, -12.5))
            Line((-54.620000001, -12.5), (-54.620000001, -7.5))
            ThreePointArc((-54.620000001, -7.5), (-57.120000001, -5), (-59.620000001, -7.5))
        make_face()
        with BuildLine():
            Line((-39.620000001, -7.5), (-39.620000001, -12.5))
            ThreePointArc((-39.620000001, -12.5), (-37.120000001, -15), (-34.620000001, -12.5))
            Line((-34.620000001, -12.5), (-34.620000001, -7.5))
            ThreePointArc((-34.620000001, -7.5), (-37.120000001, -5), (-39.620000001, -7.5))
        make_face()
        with BuildLine():
            Line((-10.5, -30.65), (-10.5, -26.65))
            ThreePointArc((-10.5, -26.65), (-13, -24.15), (-15.5, -26.65))
            Line((-15.5, -26.65), (-15.5, -30.65))
            ThreePointArc((-15.5, -30.65), (-13, -33.15), (-10.5, -30.65))
        make_face()
        with BuildLine():
            Line((-10.5, -20.65), (-10.5, -16.65))
            ThreePointArc((-10.5, -16.65), (-13, -14.15), (-15.5, -16.65))
            Line((-15.5, -16.65), (-15.5, -20.65))
            ThreePointArc((-15.5, -20.65), (-13, -23.15), (-10.5, -20.65))
        make_face()
        with Locations((2.879999999, -50)):
            Circle(CONVERT_SOLID2_7_OUTLINE_R)
        with Locations((-17.12, -70)):
            Circle(CONVERT_SOLID2_7_OUTLINE_R)
        with Locations((2.879999999, -70)):
            Circle(CONVERT_SOLID2_7_OUTLINE_R)
    extrude(amount=CONVERT_SOLID2_7_DEPTH, mode=Mode.SUBTRACT)

    # Fillet1
    fillet1_edges = [part_1.edges().sort_by_distance(p)[0] for p in [
        (1.15, -67.120000001, 1.5875),
        (22.7375, -67.120000001, -20),
        (22.7375, -27.120000001, -80),
        (22.7375, 12.879999999, -80),
        (-58.85, 12.879999999, 1.5875),
        (-58.85, -27.120000001, 1.5875),
    ]]
    fillet(fillet1_edges, radius=FILLET1_R)


solid = part_1.part
